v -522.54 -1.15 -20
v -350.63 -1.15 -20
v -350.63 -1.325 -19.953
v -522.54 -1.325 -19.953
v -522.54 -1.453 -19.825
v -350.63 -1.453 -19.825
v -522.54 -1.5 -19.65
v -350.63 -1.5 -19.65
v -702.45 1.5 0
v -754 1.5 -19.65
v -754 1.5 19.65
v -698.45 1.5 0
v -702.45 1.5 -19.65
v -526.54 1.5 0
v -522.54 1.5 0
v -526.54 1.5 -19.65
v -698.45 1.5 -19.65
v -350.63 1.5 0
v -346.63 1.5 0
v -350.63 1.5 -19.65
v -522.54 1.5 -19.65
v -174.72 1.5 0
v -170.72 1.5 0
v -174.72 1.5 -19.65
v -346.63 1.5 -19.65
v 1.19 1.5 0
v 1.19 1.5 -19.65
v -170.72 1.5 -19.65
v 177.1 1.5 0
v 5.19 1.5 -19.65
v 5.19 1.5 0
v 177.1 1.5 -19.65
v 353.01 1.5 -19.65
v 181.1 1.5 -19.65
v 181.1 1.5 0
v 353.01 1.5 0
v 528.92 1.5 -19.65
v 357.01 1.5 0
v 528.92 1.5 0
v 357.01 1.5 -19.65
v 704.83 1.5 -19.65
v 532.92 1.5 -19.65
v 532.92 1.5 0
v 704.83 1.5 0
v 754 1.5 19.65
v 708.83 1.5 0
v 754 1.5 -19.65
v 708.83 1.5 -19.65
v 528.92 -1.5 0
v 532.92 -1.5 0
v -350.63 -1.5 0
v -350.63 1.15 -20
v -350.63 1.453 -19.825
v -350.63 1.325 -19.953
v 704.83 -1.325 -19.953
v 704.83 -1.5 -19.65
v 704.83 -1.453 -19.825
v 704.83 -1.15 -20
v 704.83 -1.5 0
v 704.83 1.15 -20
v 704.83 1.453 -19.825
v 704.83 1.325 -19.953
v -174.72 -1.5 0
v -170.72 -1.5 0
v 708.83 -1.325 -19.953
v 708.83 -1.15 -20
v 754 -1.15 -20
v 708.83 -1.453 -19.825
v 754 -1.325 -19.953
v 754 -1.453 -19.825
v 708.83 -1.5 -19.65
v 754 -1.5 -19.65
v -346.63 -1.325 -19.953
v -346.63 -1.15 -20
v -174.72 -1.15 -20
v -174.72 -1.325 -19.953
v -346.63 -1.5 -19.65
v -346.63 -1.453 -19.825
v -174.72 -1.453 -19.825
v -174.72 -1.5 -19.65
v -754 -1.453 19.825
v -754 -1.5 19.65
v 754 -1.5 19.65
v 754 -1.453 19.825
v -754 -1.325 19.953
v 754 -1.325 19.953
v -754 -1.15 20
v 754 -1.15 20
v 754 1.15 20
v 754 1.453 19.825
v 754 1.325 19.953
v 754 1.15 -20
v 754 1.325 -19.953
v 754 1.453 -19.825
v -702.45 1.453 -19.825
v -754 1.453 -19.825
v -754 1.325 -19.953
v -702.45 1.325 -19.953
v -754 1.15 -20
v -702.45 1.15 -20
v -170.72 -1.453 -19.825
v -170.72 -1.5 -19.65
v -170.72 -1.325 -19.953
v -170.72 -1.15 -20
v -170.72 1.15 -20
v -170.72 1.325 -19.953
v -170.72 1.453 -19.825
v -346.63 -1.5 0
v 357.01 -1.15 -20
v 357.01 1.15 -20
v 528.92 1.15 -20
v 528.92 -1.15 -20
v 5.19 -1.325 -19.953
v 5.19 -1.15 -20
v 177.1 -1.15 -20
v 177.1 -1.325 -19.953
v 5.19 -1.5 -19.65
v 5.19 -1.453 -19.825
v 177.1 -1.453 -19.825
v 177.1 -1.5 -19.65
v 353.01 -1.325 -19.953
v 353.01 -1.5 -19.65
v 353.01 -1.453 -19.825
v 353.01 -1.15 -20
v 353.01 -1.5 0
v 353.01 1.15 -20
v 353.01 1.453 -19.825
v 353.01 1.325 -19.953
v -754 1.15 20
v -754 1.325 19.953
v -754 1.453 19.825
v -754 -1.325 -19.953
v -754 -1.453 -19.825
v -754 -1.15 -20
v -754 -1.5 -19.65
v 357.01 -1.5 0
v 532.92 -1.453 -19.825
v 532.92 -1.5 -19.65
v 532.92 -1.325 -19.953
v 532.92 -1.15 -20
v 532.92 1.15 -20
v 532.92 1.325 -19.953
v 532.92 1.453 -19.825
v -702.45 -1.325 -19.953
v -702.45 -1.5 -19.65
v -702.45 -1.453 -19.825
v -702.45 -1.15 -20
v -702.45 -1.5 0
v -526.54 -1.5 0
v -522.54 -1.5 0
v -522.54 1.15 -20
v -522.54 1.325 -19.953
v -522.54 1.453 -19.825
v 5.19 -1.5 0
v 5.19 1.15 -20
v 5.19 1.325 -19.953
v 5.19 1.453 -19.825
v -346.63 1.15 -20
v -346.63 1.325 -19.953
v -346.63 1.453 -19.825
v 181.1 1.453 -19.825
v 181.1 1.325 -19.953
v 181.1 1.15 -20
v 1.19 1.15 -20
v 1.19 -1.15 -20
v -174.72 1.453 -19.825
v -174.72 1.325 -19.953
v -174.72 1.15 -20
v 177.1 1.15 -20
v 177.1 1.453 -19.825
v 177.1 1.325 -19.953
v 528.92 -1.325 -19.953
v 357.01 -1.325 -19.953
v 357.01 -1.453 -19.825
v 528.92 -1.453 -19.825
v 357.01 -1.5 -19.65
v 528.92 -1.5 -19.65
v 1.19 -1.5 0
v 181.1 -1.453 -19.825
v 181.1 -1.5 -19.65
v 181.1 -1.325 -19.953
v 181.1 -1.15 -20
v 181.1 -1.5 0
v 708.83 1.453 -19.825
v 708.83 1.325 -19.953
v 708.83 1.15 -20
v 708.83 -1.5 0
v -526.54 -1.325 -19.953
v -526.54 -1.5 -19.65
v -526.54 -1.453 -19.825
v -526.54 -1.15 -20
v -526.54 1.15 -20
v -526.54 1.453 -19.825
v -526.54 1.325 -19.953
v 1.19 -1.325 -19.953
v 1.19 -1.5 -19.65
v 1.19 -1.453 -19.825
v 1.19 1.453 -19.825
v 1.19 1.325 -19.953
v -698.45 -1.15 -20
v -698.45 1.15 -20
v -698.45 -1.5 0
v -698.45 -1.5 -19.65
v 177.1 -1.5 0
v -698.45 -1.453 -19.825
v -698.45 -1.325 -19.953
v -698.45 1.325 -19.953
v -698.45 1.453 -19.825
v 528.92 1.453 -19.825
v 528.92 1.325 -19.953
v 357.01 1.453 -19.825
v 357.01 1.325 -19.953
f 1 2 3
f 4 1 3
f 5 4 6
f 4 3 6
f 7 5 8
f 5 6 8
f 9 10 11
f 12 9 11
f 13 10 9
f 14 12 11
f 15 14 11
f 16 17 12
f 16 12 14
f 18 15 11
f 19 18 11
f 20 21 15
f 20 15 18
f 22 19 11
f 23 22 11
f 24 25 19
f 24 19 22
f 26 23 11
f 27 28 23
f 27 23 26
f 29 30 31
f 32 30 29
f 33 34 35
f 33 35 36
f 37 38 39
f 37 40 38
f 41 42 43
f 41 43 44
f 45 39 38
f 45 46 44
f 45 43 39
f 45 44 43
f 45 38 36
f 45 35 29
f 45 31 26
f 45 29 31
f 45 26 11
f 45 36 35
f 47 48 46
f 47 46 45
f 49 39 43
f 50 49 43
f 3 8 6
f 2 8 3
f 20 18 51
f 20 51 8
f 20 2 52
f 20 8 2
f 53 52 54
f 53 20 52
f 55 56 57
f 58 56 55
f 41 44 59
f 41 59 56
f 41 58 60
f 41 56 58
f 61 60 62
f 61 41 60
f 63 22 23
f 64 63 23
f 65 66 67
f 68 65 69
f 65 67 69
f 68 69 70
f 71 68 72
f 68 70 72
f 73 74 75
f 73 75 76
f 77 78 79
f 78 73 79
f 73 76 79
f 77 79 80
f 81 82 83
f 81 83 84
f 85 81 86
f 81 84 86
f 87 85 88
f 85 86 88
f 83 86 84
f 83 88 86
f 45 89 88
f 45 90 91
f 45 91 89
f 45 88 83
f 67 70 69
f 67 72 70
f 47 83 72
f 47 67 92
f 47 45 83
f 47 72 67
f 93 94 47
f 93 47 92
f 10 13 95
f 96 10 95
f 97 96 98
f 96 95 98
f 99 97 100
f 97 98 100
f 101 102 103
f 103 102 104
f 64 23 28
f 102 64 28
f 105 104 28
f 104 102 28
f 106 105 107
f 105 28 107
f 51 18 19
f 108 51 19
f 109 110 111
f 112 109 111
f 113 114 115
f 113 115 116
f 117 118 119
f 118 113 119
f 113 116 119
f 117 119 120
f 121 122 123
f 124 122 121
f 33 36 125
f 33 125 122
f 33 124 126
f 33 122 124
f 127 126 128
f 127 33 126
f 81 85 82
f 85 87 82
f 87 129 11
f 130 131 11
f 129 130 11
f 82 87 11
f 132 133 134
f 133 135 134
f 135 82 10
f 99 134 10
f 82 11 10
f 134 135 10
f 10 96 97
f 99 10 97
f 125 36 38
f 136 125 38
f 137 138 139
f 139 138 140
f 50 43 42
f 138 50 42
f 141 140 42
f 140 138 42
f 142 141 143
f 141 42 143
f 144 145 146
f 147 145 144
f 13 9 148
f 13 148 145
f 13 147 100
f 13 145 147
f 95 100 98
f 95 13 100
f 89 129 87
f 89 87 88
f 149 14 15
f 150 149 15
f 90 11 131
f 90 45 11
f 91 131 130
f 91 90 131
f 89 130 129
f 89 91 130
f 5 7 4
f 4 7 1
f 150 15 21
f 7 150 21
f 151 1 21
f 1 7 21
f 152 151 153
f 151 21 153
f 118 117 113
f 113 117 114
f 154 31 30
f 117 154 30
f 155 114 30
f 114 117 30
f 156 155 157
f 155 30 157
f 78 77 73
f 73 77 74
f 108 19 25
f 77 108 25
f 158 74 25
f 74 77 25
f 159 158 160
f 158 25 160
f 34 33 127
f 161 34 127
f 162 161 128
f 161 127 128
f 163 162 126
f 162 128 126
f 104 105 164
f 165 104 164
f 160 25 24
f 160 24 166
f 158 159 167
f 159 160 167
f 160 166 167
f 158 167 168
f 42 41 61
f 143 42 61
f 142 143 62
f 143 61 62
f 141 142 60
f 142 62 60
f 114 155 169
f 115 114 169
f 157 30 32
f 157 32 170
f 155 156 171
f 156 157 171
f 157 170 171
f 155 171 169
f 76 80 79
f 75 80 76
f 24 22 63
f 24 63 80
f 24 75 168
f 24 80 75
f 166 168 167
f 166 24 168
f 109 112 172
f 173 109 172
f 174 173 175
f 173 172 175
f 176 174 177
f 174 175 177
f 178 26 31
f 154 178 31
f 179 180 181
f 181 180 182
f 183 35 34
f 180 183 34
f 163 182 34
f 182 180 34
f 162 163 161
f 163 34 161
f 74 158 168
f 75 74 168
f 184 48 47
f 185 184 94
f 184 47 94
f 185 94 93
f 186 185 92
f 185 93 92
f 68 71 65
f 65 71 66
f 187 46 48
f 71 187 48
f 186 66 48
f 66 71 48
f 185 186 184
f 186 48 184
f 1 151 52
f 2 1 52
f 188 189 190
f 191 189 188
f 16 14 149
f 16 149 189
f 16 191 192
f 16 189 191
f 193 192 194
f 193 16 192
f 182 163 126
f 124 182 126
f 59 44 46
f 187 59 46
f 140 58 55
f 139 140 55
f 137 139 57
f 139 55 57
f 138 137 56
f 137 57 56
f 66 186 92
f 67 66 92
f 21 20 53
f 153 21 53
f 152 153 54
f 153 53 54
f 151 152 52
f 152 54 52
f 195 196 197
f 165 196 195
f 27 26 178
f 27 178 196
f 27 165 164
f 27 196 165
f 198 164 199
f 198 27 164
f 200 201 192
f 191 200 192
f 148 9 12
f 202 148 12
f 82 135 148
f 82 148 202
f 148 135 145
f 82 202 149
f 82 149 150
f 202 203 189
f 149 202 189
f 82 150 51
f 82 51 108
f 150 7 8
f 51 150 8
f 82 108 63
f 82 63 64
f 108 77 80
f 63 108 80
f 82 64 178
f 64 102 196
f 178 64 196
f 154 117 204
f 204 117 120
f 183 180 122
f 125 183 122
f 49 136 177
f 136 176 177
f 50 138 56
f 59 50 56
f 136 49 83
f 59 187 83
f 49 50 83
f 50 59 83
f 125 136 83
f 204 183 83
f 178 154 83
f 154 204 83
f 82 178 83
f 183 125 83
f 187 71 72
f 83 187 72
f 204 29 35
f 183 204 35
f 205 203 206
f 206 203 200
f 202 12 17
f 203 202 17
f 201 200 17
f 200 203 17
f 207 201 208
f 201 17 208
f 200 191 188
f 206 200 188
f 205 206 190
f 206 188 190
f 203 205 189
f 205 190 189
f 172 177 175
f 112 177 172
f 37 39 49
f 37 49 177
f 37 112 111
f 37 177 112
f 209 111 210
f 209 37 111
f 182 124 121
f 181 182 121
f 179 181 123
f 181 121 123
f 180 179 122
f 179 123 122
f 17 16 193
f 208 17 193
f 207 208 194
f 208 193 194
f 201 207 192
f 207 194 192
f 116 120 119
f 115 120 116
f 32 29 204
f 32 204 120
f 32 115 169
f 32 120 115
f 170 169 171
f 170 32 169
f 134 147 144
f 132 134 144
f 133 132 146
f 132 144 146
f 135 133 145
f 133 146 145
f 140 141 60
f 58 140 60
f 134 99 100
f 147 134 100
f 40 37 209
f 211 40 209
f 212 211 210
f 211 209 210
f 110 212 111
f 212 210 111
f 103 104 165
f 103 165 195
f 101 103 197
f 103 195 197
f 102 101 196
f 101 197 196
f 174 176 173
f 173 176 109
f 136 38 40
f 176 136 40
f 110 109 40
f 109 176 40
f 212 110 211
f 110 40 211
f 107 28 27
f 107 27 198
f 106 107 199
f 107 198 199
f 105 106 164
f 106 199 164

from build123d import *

# Parameters (mm, degrees)
BOSS_EXTRUDE1_DEPTH      = 1.5
BOSS_EXTRUDE1_DEPTH_BACK = 1.5
SKETCH1_W                = 1508
SKETCH1_H                = 40
FILLET1_R                = 0.35
SKETCH2_W                = 4
SKETCH2_H                = 20
CUT_EXTRUDE1_DEPTH       = 755.271171397


with BuildPart() as part:
    # Sketch1 → Boss-Extrude1 (new, two sides: drawn at the far end of the back side and taken through both)
    with BuildSketch(Plane(origin=(0, 0, 0), x_dir=(1, 0, 0), z_dir=(0, 1, 0)).offset(-BOSS_EXTRUDE1_DEPTH_BACK)):
        Rectangle(SKETCH1_W, SKETCH1_H)
    extrude(amount=BOSS_EXTRUDE1_DEPTH + BOSS_EXTRUDE1_DEPTH_BACK)

    # Fillet1
    fillet1_edges = [part.edges().sort_by_distance(p)[0] for p in [
        (0, -1.5, -20),
        (0, -1.5, 20),
        (0, 1.5, -20),
        (0, 1.5, 20),
    ]]
    fillet(fillet1_edges, radius=FILLET1_R)

    # Sketch2 → Cut-Extrude1 (cut, through all)
    with BuildSketch(Plane(origin=(0, 1.5, 0), x_dir=(1, 0, 0), z_dir=(0, 1, 0))):
        with Locations((530.92, 10)):
            Rectangle(SKETCH2_W, SKETCH2_H)
        with Locations((706.83, 10)):
            Rectangle(SKETCH2_W, SKETCH2_H)
        with Locations((355.01, 10)):
            Rectangle(SKETCH2_W, SKETCH2_H)
        with Locations((179.1, 10)):
            Rectangle(SKETCH2_W, SKETCH2_H)
        with Locations((3.19, 10)):
            Rectangle(SKETCH2_W, SKETCH2_H)
        with Locations((-172.72, 10)):
            Rectangle(SKETCH2_W, SKETCH2_H)
        with Locations((-348.63, 10)):
            Rectangle(SKETCH2_W, SKETCH2_H)
        with Locations((-524.54, 10)):
            Rectangle(SKETCH2_W, SKETCH2_H)
        with Locations((-700.45, 10)):
            Rectangle(SKETCH2_W, SKETCH2_H)
    extrude(amount=-CUT_EXTRUDE1_DEPTH, mode=Mode.SUBTRACT)


solid = part.part
